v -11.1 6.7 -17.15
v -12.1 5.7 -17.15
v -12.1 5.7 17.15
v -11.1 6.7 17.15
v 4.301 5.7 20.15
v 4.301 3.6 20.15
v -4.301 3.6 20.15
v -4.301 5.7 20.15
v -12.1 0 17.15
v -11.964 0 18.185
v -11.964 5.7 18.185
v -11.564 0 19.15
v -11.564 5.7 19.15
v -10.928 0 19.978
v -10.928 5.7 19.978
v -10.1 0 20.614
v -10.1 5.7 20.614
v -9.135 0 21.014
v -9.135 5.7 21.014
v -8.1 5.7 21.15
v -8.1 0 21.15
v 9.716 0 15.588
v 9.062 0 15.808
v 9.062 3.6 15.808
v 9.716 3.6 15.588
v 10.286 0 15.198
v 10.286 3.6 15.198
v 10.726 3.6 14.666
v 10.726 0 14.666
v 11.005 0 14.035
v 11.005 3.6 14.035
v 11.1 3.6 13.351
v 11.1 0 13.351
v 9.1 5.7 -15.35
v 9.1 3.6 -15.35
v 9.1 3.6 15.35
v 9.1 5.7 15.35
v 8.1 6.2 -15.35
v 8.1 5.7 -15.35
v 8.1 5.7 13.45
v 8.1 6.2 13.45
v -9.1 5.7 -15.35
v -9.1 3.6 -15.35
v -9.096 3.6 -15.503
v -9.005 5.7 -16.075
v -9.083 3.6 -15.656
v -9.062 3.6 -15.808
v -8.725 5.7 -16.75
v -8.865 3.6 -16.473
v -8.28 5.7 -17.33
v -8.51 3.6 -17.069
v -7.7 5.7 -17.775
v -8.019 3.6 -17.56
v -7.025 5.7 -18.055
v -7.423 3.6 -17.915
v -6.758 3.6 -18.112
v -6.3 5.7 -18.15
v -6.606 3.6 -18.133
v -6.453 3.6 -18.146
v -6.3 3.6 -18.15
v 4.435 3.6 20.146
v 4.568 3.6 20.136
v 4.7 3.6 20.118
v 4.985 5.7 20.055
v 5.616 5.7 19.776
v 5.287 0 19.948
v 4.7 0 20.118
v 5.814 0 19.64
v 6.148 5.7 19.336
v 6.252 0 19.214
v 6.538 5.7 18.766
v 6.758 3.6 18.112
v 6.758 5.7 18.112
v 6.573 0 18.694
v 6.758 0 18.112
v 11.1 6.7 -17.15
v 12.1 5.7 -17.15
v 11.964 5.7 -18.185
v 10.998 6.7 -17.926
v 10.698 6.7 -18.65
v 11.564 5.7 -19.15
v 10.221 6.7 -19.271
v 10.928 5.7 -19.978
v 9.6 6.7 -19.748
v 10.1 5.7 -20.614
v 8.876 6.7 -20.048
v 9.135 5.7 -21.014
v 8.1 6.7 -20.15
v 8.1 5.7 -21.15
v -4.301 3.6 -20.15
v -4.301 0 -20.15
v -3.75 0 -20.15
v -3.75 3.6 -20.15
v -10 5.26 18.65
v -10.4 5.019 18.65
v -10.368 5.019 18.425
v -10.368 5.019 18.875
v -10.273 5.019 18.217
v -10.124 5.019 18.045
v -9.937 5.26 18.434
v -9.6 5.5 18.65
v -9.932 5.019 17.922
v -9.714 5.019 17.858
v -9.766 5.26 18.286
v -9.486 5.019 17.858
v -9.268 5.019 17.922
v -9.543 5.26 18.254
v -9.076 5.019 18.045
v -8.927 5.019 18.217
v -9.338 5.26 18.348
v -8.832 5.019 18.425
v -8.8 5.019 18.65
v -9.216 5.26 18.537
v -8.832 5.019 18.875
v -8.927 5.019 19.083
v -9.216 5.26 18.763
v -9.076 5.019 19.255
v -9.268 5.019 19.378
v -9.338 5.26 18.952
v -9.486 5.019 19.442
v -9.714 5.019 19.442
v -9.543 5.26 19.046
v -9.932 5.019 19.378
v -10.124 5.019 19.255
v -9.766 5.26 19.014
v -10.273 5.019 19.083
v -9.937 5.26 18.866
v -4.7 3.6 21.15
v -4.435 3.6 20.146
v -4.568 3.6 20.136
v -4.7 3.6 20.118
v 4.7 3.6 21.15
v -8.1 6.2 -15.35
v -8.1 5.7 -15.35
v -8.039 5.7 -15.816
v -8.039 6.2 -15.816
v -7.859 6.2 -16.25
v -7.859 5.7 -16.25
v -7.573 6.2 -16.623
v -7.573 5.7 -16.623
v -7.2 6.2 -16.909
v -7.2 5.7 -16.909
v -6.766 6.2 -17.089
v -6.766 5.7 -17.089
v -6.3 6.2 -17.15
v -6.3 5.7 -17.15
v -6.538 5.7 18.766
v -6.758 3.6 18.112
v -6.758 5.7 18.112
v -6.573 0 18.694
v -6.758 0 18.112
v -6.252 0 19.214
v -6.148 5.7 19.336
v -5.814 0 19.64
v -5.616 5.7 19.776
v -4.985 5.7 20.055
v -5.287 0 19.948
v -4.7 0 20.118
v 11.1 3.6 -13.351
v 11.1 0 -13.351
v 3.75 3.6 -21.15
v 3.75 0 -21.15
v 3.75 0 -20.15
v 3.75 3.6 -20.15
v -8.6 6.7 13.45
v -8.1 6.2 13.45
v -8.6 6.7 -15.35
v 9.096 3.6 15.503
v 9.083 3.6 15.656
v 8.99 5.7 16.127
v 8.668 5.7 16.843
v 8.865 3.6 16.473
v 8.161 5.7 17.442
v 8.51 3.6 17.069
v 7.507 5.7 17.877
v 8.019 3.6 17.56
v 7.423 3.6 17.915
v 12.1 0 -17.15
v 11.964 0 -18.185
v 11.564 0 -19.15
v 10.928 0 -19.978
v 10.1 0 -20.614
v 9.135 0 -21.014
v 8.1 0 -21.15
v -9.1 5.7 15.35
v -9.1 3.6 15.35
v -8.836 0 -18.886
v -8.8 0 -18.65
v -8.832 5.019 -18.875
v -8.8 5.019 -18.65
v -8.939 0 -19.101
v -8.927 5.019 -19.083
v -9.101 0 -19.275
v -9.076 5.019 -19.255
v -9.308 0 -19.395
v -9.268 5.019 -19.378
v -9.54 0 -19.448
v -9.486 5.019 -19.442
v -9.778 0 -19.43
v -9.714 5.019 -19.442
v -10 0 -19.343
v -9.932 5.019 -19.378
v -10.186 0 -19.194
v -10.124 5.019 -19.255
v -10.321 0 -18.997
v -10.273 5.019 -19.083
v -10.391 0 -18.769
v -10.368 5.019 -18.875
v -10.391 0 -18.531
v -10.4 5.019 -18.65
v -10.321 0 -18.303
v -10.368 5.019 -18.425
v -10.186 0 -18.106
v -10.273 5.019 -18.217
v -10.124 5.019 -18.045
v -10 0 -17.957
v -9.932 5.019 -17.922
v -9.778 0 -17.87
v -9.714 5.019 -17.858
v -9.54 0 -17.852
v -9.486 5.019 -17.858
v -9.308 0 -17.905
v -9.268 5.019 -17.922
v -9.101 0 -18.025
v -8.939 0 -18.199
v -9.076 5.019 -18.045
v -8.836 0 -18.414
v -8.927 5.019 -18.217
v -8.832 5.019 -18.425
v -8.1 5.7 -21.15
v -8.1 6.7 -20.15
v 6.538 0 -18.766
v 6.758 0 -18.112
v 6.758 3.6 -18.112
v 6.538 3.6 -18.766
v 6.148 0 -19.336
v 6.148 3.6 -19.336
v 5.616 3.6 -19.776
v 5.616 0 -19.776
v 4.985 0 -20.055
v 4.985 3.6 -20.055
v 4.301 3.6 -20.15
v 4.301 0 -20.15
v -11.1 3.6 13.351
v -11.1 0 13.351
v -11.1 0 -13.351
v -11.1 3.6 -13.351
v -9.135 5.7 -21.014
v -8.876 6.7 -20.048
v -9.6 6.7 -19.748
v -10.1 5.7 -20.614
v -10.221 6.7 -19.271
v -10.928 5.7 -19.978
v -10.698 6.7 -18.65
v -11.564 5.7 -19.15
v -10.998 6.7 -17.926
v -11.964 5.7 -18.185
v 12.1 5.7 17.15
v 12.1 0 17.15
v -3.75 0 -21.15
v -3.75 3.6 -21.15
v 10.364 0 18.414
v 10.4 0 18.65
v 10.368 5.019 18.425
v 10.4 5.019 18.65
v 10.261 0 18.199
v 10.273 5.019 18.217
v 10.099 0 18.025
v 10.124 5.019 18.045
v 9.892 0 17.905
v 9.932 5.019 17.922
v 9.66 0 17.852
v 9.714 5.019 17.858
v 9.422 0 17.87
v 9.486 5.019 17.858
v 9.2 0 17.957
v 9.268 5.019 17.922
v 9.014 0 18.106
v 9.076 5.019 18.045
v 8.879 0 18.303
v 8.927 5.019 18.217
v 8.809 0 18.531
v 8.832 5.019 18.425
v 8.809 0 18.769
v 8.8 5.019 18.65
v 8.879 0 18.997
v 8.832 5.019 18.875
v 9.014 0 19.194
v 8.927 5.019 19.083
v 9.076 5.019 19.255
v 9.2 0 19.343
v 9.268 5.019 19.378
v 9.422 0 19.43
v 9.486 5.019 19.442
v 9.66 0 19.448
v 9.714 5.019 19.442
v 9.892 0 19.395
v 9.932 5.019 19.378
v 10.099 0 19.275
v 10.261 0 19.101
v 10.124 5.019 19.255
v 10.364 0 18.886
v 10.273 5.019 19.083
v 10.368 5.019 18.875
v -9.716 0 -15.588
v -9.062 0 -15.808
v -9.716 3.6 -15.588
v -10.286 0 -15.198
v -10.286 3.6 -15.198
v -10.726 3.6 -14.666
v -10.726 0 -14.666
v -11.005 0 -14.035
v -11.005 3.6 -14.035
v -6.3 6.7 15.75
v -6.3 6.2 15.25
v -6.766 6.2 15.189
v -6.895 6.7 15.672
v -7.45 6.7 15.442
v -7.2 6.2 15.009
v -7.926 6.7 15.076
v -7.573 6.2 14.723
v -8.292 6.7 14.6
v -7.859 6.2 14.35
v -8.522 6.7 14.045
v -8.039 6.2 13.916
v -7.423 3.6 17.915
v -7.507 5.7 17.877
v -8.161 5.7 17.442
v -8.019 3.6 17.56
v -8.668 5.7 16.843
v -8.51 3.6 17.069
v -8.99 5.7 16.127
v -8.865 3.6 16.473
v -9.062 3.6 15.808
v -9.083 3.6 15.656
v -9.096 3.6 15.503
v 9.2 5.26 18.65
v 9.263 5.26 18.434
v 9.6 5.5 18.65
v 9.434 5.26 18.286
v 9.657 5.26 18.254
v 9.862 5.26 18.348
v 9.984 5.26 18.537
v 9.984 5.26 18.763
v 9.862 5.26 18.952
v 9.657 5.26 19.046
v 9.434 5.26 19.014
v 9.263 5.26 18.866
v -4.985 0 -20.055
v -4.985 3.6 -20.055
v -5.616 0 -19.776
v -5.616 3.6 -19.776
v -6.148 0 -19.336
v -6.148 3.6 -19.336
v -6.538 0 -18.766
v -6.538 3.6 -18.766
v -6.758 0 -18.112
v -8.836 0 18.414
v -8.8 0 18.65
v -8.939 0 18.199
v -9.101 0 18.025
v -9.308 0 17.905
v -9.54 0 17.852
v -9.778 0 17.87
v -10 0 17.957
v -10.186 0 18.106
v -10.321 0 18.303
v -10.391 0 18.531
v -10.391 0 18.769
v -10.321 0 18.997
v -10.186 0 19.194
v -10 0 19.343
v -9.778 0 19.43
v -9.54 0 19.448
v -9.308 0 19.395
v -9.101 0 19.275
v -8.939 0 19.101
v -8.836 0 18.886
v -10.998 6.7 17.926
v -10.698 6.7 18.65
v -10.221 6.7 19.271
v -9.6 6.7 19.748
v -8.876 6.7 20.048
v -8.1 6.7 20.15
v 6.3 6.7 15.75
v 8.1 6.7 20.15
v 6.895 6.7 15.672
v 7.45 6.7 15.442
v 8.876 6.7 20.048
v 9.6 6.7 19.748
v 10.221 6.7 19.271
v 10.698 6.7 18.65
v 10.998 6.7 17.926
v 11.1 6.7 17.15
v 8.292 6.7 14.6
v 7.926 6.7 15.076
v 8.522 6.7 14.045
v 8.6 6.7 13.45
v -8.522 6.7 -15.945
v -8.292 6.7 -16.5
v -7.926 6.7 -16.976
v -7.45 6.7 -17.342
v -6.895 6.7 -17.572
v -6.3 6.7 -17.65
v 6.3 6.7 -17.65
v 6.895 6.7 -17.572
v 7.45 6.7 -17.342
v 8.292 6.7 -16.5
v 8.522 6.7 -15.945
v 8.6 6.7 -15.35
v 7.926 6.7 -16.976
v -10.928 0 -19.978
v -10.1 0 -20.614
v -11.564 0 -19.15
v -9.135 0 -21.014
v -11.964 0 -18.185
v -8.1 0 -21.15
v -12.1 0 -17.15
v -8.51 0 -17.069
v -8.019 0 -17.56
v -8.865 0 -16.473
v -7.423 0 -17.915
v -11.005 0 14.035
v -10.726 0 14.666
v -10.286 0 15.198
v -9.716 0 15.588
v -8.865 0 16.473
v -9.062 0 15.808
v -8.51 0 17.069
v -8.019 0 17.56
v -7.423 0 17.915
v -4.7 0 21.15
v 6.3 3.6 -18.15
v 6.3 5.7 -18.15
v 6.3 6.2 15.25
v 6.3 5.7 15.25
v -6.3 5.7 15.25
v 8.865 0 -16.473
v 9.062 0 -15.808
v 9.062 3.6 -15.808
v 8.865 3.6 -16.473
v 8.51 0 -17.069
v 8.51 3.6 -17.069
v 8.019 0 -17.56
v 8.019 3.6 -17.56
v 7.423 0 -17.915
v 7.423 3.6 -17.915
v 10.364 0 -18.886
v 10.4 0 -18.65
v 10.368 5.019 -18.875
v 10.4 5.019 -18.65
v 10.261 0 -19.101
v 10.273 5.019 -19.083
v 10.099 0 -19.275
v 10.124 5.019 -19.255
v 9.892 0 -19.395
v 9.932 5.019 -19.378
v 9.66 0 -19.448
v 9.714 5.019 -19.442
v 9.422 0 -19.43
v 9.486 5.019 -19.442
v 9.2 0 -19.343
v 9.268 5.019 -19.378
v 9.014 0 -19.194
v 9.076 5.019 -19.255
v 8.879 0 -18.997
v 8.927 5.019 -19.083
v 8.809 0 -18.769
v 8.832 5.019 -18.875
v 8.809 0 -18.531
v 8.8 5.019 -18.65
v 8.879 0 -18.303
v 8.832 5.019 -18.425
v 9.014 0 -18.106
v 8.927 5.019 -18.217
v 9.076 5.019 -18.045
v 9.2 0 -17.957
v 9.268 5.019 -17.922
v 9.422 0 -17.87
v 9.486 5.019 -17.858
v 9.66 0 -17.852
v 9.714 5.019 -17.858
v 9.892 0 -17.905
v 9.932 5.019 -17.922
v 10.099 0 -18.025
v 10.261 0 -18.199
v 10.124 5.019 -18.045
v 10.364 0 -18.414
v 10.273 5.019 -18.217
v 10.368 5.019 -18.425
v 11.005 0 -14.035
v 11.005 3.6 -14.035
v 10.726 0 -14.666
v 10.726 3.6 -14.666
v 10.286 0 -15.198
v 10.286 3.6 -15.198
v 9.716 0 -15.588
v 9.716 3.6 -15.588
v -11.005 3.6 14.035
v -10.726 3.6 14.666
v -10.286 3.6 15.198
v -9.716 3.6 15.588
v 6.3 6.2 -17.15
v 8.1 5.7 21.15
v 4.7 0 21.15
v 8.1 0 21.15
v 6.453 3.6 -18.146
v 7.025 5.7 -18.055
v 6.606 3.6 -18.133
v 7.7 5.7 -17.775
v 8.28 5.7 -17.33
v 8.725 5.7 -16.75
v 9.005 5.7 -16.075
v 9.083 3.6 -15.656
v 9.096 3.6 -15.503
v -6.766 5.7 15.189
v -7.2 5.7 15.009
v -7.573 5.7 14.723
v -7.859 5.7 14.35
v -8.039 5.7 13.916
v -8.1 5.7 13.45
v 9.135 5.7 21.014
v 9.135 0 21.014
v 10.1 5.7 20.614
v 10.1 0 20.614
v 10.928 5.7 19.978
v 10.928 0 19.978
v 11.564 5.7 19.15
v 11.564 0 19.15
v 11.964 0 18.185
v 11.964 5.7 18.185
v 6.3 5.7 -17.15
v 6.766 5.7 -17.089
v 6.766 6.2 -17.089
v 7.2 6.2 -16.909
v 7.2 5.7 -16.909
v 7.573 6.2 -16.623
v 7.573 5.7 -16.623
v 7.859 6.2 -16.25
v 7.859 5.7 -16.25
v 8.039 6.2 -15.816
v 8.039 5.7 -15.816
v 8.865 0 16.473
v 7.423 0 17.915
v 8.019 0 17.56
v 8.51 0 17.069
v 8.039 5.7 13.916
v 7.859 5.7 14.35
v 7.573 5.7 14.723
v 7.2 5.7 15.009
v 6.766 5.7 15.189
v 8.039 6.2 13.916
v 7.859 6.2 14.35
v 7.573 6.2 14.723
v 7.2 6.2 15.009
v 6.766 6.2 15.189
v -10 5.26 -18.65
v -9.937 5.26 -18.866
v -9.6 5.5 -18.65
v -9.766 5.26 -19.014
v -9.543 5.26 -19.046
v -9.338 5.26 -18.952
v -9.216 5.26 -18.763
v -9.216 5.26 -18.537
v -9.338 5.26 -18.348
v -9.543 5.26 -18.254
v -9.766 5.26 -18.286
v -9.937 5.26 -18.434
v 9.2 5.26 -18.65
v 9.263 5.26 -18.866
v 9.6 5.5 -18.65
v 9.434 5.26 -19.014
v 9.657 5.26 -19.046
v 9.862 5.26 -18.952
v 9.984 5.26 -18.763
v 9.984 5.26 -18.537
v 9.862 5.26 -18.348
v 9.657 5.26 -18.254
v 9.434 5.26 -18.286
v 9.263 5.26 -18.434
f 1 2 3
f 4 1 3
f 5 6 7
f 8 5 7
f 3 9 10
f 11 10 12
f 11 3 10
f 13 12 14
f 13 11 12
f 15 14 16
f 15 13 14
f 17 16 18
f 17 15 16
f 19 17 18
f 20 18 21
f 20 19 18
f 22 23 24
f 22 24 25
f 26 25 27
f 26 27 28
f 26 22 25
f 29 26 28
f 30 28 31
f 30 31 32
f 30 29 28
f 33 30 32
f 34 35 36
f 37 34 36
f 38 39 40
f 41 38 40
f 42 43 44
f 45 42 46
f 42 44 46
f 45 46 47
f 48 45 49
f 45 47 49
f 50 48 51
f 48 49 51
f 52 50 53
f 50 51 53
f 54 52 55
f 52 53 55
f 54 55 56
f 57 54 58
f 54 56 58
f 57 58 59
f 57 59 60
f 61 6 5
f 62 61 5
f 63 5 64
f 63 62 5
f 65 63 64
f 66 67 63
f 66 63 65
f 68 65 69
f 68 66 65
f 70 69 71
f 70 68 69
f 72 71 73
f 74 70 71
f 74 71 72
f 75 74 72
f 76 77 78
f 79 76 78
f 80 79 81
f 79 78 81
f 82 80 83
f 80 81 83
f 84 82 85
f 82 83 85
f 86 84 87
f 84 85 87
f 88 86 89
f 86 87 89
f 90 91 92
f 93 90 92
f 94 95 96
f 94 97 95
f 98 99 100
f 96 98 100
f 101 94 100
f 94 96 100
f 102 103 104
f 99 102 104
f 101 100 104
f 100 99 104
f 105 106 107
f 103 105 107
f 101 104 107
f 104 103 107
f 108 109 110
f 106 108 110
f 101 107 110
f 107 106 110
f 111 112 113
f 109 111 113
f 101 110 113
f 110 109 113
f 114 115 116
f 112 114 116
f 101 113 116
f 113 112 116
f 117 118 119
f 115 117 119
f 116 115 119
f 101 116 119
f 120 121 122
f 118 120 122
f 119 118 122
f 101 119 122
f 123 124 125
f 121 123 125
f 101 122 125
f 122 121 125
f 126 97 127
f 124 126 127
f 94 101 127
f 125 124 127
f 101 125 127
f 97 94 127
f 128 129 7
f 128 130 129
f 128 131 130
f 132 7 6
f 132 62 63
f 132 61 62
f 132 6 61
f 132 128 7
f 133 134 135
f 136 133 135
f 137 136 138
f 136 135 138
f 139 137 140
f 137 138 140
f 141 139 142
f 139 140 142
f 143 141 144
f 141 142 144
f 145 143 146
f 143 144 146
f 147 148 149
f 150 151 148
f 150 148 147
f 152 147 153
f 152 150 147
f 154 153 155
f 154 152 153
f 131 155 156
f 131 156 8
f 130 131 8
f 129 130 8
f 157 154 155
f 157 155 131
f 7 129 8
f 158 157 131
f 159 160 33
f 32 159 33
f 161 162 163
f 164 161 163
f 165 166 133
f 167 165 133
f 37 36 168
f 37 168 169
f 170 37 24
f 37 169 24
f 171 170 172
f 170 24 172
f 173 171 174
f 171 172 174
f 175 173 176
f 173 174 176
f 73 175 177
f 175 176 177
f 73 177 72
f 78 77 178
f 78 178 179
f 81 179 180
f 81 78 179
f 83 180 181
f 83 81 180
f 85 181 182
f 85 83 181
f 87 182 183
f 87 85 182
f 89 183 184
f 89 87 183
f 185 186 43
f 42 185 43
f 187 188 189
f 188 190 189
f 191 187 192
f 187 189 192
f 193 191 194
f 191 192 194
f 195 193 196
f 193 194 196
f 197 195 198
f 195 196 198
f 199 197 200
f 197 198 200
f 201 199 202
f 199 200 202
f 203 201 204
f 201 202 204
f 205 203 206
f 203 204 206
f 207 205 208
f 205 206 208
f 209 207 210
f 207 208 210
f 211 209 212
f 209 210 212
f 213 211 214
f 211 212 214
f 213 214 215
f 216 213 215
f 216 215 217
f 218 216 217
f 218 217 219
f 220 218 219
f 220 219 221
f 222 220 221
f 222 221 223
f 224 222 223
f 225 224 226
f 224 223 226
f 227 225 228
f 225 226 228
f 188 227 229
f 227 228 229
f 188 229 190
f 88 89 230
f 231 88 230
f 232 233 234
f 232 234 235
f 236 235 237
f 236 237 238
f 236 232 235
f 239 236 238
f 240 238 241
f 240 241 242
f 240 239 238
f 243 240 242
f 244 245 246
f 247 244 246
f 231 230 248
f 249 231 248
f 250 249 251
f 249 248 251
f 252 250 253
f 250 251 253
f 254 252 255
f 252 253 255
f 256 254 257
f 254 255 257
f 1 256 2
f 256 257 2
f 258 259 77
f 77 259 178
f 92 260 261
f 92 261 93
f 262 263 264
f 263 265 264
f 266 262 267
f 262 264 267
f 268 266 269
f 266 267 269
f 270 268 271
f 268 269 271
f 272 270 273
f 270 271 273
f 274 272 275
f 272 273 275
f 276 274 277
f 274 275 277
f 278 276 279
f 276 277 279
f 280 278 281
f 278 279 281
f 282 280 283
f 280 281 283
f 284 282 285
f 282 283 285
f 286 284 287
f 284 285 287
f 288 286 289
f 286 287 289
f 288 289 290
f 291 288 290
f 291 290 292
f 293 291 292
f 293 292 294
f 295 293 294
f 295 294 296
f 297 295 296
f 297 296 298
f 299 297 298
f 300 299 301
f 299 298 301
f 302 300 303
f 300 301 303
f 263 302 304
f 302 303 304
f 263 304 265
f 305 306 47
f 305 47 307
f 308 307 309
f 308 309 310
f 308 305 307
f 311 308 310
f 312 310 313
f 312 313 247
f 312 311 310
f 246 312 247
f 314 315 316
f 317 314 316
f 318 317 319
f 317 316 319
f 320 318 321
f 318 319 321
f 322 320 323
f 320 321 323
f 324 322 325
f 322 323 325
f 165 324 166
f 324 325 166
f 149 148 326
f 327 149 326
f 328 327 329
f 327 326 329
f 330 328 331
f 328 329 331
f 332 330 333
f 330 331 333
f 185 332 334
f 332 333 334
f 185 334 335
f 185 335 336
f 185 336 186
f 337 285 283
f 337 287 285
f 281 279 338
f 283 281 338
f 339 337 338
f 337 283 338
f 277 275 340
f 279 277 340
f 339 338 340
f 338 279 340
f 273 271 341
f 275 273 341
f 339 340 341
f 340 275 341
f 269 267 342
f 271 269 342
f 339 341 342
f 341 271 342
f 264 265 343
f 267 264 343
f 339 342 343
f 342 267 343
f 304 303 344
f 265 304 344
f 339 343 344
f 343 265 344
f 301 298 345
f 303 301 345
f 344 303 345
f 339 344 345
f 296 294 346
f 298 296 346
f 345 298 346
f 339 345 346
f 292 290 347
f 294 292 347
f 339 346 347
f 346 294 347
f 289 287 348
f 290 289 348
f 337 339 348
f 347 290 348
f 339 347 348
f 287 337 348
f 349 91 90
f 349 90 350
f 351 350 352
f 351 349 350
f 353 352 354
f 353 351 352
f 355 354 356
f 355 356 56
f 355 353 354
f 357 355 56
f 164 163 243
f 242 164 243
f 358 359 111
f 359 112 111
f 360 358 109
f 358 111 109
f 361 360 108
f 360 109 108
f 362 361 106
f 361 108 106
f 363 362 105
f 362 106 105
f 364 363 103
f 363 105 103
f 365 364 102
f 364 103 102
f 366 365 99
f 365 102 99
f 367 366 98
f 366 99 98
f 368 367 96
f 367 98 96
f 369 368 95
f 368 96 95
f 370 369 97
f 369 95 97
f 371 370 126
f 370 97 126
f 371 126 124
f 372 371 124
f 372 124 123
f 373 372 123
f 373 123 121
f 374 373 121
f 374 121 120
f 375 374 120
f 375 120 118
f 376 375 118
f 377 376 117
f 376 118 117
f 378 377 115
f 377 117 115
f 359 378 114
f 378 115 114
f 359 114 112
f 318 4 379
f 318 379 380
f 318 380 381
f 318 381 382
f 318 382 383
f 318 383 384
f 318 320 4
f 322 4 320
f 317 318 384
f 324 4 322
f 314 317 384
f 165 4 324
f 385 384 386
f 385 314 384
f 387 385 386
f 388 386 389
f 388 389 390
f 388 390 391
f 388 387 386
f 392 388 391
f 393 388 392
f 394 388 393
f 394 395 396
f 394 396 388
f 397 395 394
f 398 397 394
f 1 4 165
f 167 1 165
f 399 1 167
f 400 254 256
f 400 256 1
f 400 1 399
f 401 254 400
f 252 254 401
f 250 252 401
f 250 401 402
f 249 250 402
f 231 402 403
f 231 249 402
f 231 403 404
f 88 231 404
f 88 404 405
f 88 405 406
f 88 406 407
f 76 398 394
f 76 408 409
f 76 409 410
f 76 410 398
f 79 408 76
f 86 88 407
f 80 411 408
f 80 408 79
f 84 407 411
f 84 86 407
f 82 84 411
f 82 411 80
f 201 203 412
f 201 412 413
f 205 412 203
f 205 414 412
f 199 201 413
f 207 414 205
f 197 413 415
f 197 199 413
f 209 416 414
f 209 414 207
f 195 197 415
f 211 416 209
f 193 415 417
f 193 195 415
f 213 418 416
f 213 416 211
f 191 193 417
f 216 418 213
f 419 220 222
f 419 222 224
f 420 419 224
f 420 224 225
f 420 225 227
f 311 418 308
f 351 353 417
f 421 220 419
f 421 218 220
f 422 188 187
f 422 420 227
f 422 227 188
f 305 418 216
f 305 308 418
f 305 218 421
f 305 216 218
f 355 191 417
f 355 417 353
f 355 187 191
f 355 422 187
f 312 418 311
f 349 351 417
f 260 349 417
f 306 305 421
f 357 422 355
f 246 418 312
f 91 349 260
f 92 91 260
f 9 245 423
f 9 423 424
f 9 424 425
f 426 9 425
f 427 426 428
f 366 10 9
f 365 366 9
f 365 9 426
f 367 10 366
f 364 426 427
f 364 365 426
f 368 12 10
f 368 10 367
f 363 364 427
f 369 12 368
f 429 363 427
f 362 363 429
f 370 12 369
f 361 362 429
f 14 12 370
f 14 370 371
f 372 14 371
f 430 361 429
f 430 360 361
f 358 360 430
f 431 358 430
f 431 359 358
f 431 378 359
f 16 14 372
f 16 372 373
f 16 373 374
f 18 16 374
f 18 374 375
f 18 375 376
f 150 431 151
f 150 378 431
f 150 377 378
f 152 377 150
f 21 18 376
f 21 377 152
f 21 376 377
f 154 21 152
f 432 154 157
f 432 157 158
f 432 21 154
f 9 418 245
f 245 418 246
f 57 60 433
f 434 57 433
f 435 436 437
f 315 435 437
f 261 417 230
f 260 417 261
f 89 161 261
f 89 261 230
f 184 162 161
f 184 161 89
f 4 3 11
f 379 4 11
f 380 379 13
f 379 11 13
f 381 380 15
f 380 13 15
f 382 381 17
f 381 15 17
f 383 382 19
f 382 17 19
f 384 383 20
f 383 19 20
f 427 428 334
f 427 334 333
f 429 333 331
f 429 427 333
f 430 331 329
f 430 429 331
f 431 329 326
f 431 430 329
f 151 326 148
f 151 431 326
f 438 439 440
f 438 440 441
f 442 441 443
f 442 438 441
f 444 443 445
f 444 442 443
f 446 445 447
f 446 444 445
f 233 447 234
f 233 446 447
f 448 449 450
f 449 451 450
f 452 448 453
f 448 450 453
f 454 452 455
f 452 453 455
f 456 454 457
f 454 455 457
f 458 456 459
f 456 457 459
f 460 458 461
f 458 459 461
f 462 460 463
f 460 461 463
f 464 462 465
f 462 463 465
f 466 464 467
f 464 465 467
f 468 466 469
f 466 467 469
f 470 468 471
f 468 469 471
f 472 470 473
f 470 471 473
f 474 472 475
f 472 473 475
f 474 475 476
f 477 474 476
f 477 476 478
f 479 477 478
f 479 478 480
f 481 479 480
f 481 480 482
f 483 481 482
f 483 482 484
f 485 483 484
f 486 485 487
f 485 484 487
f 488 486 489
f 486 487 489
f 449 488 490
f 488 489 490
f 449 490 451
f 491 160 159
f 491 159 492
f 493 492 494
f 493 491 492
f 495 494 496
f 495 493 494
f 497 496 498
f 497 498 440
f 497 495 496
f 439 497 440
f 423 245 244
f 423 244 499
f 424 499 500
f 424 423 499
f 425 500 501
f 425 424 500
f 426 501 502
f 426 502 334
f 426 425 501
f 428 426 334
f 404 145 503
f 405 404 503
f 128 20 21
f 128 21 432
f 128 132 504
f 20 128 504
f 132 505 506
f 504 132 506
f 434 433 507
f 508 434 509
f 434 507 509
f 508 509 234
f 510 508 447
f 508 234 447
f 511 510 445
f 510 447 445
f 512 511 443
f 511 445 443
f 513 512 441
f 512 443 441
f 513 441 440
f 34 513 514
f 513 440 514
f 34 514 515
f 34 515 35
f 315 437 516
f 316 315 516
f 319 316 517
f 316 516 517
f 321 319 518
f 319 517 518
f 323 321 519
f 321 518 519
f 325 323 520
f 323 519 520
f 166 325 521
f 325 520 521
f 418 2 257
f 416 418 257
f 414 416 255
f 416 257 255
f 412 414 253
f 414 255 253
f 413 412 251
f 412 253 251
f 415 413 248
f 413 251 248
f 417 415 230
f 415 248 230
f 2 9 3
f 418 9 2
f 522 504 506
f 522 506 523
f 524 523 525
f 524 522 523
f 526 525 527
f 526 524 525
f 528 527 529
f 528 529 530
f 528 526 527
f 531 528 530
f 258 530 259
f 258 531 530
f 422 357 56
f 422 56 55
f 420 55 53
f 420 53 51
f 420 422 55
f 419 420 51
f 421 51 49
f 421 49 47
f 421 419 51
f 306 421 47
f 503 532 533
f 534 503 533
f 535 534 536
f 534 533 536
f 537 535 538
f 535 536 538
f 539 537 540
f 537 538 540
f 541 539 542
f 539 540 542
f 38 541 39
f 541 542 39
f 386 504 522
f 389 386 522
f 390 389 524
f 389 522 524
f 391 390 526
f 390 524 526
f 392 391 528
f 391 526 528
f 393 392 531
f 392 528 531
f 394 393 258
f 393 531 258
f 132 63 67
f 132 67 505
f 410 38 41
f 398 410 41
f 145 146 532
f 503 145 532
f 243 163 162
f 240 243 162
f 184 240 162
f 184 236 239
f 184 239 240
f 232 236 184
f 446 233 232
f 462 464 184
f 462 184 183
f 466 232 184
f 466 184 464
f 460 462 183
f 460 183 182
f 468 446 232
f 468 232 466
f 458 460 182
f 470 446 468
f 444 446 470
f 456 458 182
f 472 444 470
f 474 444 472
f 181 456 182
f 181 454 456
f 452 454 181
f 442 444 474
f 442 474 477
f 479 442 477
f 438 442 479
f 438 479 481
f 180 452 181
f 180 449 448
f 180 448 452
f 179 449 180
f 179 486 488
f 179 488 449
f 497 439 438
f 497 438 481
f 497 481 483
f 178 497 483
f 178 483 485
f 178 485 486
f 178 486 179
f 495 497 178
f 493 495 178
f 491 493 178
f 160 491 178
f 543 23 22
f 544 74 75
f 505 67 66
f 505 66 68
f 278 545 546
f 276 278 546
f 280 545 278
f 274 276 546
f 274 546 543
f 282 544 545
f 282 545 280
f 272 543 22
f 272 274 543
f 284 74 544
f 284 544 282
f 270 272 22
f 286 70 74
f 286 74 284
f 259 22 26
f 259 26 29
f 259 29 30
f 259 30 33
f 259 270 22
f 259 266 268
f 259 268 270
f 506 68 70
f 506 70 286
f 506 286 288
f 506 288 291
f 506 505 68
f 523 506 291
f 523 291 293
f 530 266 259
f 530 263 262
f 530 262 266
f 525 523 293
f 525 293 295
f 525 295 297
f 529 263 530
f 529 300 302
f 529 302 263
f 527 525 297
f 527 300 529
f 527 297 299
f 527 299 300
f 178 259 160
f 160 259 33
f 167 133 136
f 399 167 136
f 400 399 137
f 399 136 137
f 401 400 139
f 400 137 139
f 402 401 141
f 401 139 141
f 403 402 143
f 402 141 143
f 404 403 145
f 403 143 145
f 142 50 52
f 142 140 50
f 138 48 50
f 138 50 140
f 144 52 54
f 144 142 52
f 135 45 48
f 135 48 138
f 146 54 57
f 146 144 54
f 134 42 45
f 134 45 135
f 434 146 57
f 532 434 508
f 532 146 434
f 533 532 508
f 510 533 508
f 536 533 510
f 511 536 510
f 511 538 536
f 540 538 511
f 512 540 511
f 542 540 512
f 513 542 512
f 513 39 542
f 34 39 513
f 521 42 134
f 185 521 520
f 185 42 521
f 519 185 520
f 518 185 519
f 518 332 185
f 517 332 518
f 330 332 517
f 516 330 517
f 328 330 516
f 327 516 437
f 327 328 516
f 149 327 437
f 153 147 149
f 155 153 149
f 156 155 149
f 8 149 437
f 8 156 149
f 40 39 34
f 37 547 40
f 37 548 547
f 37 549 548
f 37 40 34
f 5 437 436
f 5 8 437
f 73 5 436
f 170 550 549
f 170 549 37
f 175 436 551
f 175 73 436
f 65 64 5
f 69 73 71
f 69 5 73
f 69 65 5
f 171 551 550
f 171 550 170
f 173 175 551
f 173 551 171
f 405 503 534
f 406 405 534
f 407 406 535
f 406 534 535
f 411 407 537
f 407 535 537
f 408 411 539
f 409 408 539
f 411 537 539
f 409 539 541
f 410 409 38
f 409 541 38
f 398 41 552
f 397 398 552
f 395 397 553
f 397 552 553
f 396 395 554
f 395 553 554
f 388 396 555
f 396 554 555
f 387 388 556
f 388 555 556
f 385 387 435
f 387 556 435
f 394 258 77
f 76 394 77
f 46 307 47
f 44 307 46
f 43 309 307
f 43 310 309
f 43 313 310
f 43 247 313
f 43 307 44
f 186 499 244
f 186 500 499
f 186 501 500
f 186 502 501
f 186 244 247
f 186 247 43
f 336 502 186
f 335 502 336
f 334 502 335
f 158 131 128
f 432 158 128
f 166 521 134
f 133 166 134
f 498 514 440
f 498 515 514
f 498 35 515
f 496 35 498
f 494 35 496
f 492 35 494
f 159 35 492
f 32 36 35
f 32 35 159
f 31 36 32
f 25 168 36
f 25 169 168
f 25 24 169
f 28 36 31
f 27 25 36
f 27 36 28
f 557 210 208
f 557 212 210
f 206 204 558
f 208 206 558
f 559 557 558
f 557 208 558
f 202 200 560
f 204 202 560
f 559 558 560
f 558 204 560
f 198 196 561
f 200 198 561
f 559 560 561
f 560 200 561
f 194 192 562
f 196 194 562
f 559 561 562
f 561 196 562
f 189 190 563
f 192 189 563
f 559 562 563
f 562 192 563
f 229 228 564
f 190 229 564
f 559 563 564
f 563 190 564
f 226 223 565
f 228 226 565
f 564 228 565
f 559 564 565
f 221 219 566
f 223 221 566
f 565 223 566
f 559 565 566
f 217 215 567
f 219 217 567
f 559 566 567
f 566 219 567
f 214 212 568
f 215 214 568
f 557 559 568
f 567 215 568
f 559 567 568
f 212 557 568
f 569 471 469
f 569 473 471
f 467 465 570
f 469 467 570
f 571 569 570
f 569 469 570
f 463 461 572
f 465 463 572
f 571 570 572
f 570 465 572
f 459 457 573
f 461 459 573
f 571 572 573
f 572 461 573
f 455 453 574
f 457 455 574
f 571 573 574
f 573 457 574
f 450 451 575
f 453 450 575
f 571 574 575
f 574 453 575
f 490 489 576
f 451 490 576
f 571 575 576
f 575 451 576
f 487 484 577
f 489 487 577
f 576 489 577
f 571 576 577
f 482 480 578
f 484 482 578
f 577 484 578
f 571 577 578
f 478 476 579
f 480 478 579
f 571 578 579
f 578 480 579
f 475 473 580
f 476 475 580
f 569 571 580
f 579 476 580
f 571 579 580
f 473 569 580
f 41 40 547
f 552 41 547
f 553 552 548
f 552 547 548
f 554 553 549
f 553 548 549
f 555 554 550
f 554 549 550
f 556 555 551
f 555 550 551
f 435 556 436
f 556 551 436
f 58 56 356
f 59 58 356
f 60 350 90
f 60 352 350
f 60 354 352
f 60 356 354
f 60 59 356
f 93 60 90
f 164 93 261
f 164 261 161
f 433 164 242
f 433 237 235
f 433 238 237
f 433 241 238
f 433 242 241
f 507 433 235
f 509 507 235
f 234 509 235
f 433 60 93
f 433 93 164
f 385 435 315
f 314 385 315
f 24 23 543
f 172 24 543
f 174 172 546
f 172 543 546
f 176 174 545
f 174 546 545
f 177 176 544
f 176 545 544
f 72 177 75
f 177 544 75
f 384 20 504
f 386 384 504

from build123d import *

# Parameters (mm, degrees)
SKETCH_1_W          = 24.2
SKETCH_1_H          = 42.3
EXTRUDE_1_DEPTH     = 6.7
FILLET_1_R          = 4
CUT_EXTRUDE_1_DEPTH = 5.7
CUT_EXTRUDE_2_DEPTH = 26.024438056
CHAMFER_1_SIZE      = 0.5
CHAMFER_2_SIZE      = 1
CUT_EXTRUDE_3_DEPTH = 3.6
EXTRUDE_START       = 3.6
EXTRUDE_2_DEPTH     = 3.6
CUT_EXTRUDE_5_DEPTH = 2.1
FILLET_4_R          = 2.5
M2X0_4_3_D          = 1.6
M2X0_4_3_DEPTH      = 5.019311505
M2X0_4_3_TIP        = 0.480688495
SKETCH_14_W         = 7.5
SKETCH_14_H         = 1
CUT_EXTRUDE_6_DEPTH = 3.6
SKETCH_15_W         = 9.4
SKETCH_15_H         = 1.594635817
CUT_EXTRUDE_7_DEPTH = 3.6


with BuildPart() as part:
    # 草图1 → 凸台-拉伸1 (new body)
    with BuildSketch(Plane(origin=(0, 0, 0), x_dir=(1, 0, 0), z_dir=(0, 1, 0))):
        Rectangle(SKETCH_1_W, SKETCH_1_H)
    extrude(amount=EXTRUDE_1_DEPTH)

    # 圆角1
    fillet_1_edges = [part.edges().sort_by_distance(p)[0] for p in [
        (12.1, 3.35, 21.15),
        (-12.1, 3.35, 21.15),
        (-12.1, 3.35, -21.15),
        (12.1, 3.35, -21.15),
    ]]
    fillet(fillet_1_edges, radius=FILLET_1_R)

    # 草图2 → 切除-拉伸1 (cut)
    with BuildSketch(Plane.XZ):
        with BuildLine():
            Line((-6.3, -18.15), (6.3, -18.15))
            ThreePointArc((6.3, -18.15), (8.279898987, -17.329898987), (9.1, -15.35))
            Line((9.1, -15.35), (9.1, 15.35))
            ThreePointArc((9.1, 15.35), (8.279898987, 17.329898987), (6.3, 18.15))
            Line((6.3, 18.15), (-6.3, 18.15))
            ThreePointArc((-6.3, 18.15), (-8.279898987, 17.329898987), (-9.1, 15.35))
            Line((-9.1, 15.35), (-9.1, -15.35))
            ThreePointArc((-9.1, -15.35), (-8.279898987, -17.329898987), (-6.3, -18.15))
        make_face()
    extrude(amount=-CUT_EXTRUDE_1_DEPTH, mode=Mode.SUBTRACT)

    # 草图3 → 切除-拉伸2 (cut, through all)
    with BuildSketch(Plane.XZ.offset(-5.7)):
        with BuildLine():
            Line((-6.3, -17.15), (6.3, -17.15))
            ThreePointArc((6.3, -17.15), (7.572792206, -16.622792206), (8.1, -15.35))
            Line((8.1, -15.35), (8.1, 13.45))
            ThreePointArc((8.1, 13.45), (7.572792206, 14.722792206), (6.3, 15.25))
            Line((6.3, 15.25), (-6.3, 15.25))
            ThreePointArc((-6.3, 15.25), (-7.572792206, 14.722792206), (-8.1, 13.45))
            Line((-8.1, 13.45), (-8.1, -15.35))
            ThreePointArc((-8.1, -15.35), (-7.572792206, -16.622792206), (-6.3, -17.15))
        make_face()
    extrude(amount=-CUT_EXTRUDE_2_DEPTH, mode=Mode.SUBTRACT)

    # 倒角1
    chamfer_1_edges = [part.edges().sort_by_distance(p)[0] for p in [
        (-7.572792206, 6.7, 14.722792206),
        (0, 6.7, 15.25),
        (7.572792206, 6.7, 14.722792206),
        (8.1, 6.7, -0.95),
        (7.572792206, 6.7, -16.622792206),
        (0, 6.7, -17.15),
        (-7.572792206, 6.7, -16.622792206),
        (-8.1, 6.7, -0.95),
    ]]
    chamfer(chamfer_1_edges, length=CHAMFER_1_SIZE)

    # 倒角2
    chamfer_2_edges = [part.edges().sort_by_distance(p)[0] for p in [
        (12.1, 6.7, 0),
        (0, 6.7, 21.15),
        (0, 6.7, -21.15),
        (-12.1, 6.7, 0),
        (-10.928427125, 6.7, 19.978427125),
        (10.928427125, 6.7, -19.978427125),
        (-10.928427125, 6.7, -19.978427125),
        (10.928427125, 6.7, 19.978427125),
    ]]
    chamfer(chamfer_2_edges, length=CHAMFER_2_SIZE)

    # 草图4 → 切除-拉伸3 (cut)
    with BuildSketch(Plane.XZ):
        with BuildLine():
            Line((11.1, -17.15), (11.1, 17.15))
            ThreePointArc((11.1, 17.15), (10.221320344, 19.271320344), (8.1, 20.15))
            Line((8.1, 20.15), (-8.1, 20.15))
            ThreePointArc((-8.1, 20.15), (-10.221320344, 19.271320344), (-11.1, 17.15))
            Line((-11.1, 17.15), (-11.1, -17.15))
            ThreePointArc((-11.1, -17.15), (-10.221320344, -19.271320344), (-8.1, -20.15))
            Line((-8.1, -20.15), (8.1, -20.15))
            ThreePointArc((8.1, -20.15), (10.221320344, -19.271320344), (11.1, -17.15))
        make_face()
    extrude(amount=-CUT_EXTRUDE_3_DEPTH, mode=Mode.SUBTRACT)

    # 草图7 → 凸台-拉伸2 (add)
    with BuildSketch(Plane.XZ.offset(-3.6).offset(EXTRUDE_START)):
        with BuildLine():
            Line((6.758096095, 20.15), (8.1, 20.15))
            ThreePointArc((8.1, 20.15), (10.221320344, 19.271320344), (11.1, 17.15))
            Line((11.1, 17.15), (11.1, 15.808096095))
            Line((11.1, 15.808096095), (9.062272247, 15.808096095))
            ThreePointArc((9.062272247, 15.808096095), (8.279898987, 17.329898987), (6.758096095, 18.112272247))
            Line((6.758096095, 18.112272247), (6.758096095, 20.15))
        make_face()
        with BuildLine():
            Line((-6.758096095, 20.15), (-8.1, 20.15))
            ThreePointArc((-8.1, 20.15), (-10.221320344, 19.271320344), (-11.1, 17.15))
            Line((-11.1, 17.15), (-11.1, 15.808096095))
            Line((-11.1, 15.808096095), (-9.062272247, 15.808096095))
            ThreePointArc((-9.062272247, 15.808096095), (-8.279898987, 17.329898987), (-6.758096095, 18.112272247))
            Line((-6.758096095, 18.112272247), (-6.758096095, 20.15))
        make_face()
        with BuildLine():
            Line((-8.1, -20.15), (-6.758096095, -20.15))
            Line((-6.758096095, -20.15), (-6.758096095, -18.112272247))
            ThreePointArc((-6.758096095, -18.112272247), (-8.279898987, -17.329898987), (-9.062272247, -15.808096095))
            Line((-9.062272247, -15.808096095), (-11.1, -15.808096095))
            Line((-11.1, -15.808096095), (-11.1, -17.15))
            ThreePointArc((-11.1, -17.15), (-10.221320344, -19.271320344), (-8.1, -20.15))
        make_face()
        with BuildLine():
            Line((11.1, -17.15), (11.1, -15.808096095))
            Line((11.1, -15.808096095), (9.062272247, -15.808096095))
            ThreePointArc((9.062272247, -15.808096095), (8.279898987, -17.329898987), (6.758096095, -18.112272247))
            Line((6.758096095, -18.112272247), (6.758096095, -20.15))
            Line((6.758096095, -20.15), (8.1, -20.15))
            ThreePointArc((8.1, -20.15), (10.221320344, -19.271320344), (11.1, -17.15))
        make_face()
    extrude(amount=-EXTRUDE_2_DEPTH)

    # 草图13 → 切除-拉伸5 (cut)
    with BuildSketch(Plane.XZ.offset(-3.6)):
        with BuildLine():
            Line((6.758096095, 18.112272247), (6.758096095, 20.15))
            Line((6.758096095, 20.15), (-6.758096095, 20.15))
            Line((-6.758096095, 20.15), (-6.758096095, 18.112272247))
            ThreePointArc((-6.758096095, 18.112272247), (-6.529823528, 18.140552122), (-6.3, 18.15))
            Line((-6.3, 18.15), (6.3, 18.15))
            ThreePointArc((6.3, 18.15), (6.529823528, 18.140552122), (6.758096095, 18.112272247))
        make_face()
    extrude(amount=-CUT_EXTRUDE_5_DEPTH, mode=Mode.SUBTRACT)

    # 圆角4
    # the kernel refuses this fillet: 2.5 mm, written as the material it adds along each edge
    with BuildSketch(Plane(origin=(-11.1, 0, 15.808096095), x_dir=(0, 0, -1), z_dir=(0, 1, 0)), Plane(origin=(11.1, 0, -15.808096095), x_dir=(0, 0, 1), z_dir=(0, 1, 0)), Plane(origin=(-6.758096095, 0, -20.15), x_dir=(1, 0, 0), z_dir=(0, 1, 0))) as fillet_4_piece_1:
        with BuildLine():
            CenterArc((2.456889165, -2.5), FILLET_4_R, 90, 79.34417895)
            Line((0, -2.037727753), (-0.049137783, -2.028482308))
            ThreePointArc((-0.049137783, -2.028482308), (-0.05, -1.018863876), (-0.05, 0))
            Line((-0.05, 0), (0, 0.05))
            Line((0, 0.05), (2.456889165, 0.05))
            Line((2.456889165, 0.05), (2.456889165, 0))
        make_face()
    extrude(amount=3.6)
    with BuildSketch(Plane(origin=(-6.758096095, 0, 20.15), x_dir=(0, 0, -1), z_dir=(0, 1, 0))) as fillet_4_piece_2:
        with BuildLine():
            CenterArc((2.5, -2.456889165), FILLET_4_R, 100.65582105, 79.34417895)
            Line((0, -2.456889165), (-0.05, -2.456889165))
            Line((-0.05, -2.456889165), (-0.05, 0))
            Line((-0.05, 0), (0, 0.05))
            ThreePointArc((0, 0.05), (1.018863876, 0.05), (2.028482308, 0.049137783))
            Line((2.028482308, 0.049137783), (2.037727753, 0))
        make_face()
    extrude(amount=5.7)
    with BuildSketch(Plane(origin=(6.758096095, 0, 20.15), x_dir=(-1, 0, 0), z_dir=(0, 1, 0))) as fillet_4_piece_3:
        with BuildLine():
            CenterArc((2.456889165, -2.5), FILLET_4_R, 90, 79.34417895)
            Line((0, -2.037727753), (-0.049137783, -2.028482308))
            ThreePointArc((-0.049137783, -2.028482308), (-0.05, -1.018863876), (-0.05, 0))
            Line((-0.05, 0), (0, 0.05))
            Line((0, 0.05), (2.456889165, 0.05))
            Line((2.456889165, 0.05), (2.456889165, 0))
        make_face()
    extrude(amount=5.7)
    with BuildSketch(Plane(origin=(11.1, 0, 15.808096095), x_dir=(-1, 0, 0), z_dir=(0, 1, 0)), Plane(origin=(-11.1, 0, -15.808096095), x_dir=(1, 0, 0), z_dir=(0, 1, 0)), Plane(origin=(6.758096095, 0, -20.15), x_dir=(0, 0, 1), z_dir=(0, 1, 0))) as fillet_4_piece_4:
        with BuildLine():
            CenterArc((2.5, -2.456889165), FILLET_4_R, 100.65582105, 79.34417895)
            Line((0, -2.456889165), (-0.05, -2.456889165))
            Line((-0.05, -2.456889165), (-0.05, 0))
            Line((-0.05, 0), (0, 0.05))
            ThreePointArc((0, 0.05), (1.018863876, 0.05), (2.028482308, 0.049137783))
            Line((2.028482308, 0.049137783), (2.037727753, 0))
        make_face()
    extrude(amount=3.6)

    # M2x0.4 螺纹孔3
    with Locations(Plane(origin=(0, 0, 0), x_dir=(-1, 0, 0), z_dir=(0, -1, 0))):
        with Locations((-9.6, 18.65), (9.6, 18.65), (9.6, -18.65), (-9.6, -18.65)):
            Hole(M2X0_4_3_D / 2, depth=M2X0_4_3_DEPTH)
            with Locations((0, 0, -(M2X0_4_3_DEPTH + M2X0_4_3_TIP / 2))):  # 118° drill point
                Cone(0, M2X0_4_3_D / 2, M2X0_4_3_TIP, mode=Mode.SUBTRACT)

    # 草图14 → 切除-拉伸6 (cut)
    with BuildSketch(Plane.XZ):
        with Locations((0, -20.65)):
            Rectangle(SKETCH_14_W, SKETCH_14_H)
    extrude(amount=-CUT_EXTRUDE_6_DEPTH, mode=Mode.SUBTRACT)

    # 草图15 → 切除-拉伸7 (cut)
    with BuildSketch(Plane.XZ):
        with Locations((0, 20.352682092)):
            Rectangle(SKETCH_15_W, SKETCH_15_H)
    extrude(amount=-CUT_EXTRUDE_7_DEPTH, mode=Mode.SUBTRACT)


solid = part.part
